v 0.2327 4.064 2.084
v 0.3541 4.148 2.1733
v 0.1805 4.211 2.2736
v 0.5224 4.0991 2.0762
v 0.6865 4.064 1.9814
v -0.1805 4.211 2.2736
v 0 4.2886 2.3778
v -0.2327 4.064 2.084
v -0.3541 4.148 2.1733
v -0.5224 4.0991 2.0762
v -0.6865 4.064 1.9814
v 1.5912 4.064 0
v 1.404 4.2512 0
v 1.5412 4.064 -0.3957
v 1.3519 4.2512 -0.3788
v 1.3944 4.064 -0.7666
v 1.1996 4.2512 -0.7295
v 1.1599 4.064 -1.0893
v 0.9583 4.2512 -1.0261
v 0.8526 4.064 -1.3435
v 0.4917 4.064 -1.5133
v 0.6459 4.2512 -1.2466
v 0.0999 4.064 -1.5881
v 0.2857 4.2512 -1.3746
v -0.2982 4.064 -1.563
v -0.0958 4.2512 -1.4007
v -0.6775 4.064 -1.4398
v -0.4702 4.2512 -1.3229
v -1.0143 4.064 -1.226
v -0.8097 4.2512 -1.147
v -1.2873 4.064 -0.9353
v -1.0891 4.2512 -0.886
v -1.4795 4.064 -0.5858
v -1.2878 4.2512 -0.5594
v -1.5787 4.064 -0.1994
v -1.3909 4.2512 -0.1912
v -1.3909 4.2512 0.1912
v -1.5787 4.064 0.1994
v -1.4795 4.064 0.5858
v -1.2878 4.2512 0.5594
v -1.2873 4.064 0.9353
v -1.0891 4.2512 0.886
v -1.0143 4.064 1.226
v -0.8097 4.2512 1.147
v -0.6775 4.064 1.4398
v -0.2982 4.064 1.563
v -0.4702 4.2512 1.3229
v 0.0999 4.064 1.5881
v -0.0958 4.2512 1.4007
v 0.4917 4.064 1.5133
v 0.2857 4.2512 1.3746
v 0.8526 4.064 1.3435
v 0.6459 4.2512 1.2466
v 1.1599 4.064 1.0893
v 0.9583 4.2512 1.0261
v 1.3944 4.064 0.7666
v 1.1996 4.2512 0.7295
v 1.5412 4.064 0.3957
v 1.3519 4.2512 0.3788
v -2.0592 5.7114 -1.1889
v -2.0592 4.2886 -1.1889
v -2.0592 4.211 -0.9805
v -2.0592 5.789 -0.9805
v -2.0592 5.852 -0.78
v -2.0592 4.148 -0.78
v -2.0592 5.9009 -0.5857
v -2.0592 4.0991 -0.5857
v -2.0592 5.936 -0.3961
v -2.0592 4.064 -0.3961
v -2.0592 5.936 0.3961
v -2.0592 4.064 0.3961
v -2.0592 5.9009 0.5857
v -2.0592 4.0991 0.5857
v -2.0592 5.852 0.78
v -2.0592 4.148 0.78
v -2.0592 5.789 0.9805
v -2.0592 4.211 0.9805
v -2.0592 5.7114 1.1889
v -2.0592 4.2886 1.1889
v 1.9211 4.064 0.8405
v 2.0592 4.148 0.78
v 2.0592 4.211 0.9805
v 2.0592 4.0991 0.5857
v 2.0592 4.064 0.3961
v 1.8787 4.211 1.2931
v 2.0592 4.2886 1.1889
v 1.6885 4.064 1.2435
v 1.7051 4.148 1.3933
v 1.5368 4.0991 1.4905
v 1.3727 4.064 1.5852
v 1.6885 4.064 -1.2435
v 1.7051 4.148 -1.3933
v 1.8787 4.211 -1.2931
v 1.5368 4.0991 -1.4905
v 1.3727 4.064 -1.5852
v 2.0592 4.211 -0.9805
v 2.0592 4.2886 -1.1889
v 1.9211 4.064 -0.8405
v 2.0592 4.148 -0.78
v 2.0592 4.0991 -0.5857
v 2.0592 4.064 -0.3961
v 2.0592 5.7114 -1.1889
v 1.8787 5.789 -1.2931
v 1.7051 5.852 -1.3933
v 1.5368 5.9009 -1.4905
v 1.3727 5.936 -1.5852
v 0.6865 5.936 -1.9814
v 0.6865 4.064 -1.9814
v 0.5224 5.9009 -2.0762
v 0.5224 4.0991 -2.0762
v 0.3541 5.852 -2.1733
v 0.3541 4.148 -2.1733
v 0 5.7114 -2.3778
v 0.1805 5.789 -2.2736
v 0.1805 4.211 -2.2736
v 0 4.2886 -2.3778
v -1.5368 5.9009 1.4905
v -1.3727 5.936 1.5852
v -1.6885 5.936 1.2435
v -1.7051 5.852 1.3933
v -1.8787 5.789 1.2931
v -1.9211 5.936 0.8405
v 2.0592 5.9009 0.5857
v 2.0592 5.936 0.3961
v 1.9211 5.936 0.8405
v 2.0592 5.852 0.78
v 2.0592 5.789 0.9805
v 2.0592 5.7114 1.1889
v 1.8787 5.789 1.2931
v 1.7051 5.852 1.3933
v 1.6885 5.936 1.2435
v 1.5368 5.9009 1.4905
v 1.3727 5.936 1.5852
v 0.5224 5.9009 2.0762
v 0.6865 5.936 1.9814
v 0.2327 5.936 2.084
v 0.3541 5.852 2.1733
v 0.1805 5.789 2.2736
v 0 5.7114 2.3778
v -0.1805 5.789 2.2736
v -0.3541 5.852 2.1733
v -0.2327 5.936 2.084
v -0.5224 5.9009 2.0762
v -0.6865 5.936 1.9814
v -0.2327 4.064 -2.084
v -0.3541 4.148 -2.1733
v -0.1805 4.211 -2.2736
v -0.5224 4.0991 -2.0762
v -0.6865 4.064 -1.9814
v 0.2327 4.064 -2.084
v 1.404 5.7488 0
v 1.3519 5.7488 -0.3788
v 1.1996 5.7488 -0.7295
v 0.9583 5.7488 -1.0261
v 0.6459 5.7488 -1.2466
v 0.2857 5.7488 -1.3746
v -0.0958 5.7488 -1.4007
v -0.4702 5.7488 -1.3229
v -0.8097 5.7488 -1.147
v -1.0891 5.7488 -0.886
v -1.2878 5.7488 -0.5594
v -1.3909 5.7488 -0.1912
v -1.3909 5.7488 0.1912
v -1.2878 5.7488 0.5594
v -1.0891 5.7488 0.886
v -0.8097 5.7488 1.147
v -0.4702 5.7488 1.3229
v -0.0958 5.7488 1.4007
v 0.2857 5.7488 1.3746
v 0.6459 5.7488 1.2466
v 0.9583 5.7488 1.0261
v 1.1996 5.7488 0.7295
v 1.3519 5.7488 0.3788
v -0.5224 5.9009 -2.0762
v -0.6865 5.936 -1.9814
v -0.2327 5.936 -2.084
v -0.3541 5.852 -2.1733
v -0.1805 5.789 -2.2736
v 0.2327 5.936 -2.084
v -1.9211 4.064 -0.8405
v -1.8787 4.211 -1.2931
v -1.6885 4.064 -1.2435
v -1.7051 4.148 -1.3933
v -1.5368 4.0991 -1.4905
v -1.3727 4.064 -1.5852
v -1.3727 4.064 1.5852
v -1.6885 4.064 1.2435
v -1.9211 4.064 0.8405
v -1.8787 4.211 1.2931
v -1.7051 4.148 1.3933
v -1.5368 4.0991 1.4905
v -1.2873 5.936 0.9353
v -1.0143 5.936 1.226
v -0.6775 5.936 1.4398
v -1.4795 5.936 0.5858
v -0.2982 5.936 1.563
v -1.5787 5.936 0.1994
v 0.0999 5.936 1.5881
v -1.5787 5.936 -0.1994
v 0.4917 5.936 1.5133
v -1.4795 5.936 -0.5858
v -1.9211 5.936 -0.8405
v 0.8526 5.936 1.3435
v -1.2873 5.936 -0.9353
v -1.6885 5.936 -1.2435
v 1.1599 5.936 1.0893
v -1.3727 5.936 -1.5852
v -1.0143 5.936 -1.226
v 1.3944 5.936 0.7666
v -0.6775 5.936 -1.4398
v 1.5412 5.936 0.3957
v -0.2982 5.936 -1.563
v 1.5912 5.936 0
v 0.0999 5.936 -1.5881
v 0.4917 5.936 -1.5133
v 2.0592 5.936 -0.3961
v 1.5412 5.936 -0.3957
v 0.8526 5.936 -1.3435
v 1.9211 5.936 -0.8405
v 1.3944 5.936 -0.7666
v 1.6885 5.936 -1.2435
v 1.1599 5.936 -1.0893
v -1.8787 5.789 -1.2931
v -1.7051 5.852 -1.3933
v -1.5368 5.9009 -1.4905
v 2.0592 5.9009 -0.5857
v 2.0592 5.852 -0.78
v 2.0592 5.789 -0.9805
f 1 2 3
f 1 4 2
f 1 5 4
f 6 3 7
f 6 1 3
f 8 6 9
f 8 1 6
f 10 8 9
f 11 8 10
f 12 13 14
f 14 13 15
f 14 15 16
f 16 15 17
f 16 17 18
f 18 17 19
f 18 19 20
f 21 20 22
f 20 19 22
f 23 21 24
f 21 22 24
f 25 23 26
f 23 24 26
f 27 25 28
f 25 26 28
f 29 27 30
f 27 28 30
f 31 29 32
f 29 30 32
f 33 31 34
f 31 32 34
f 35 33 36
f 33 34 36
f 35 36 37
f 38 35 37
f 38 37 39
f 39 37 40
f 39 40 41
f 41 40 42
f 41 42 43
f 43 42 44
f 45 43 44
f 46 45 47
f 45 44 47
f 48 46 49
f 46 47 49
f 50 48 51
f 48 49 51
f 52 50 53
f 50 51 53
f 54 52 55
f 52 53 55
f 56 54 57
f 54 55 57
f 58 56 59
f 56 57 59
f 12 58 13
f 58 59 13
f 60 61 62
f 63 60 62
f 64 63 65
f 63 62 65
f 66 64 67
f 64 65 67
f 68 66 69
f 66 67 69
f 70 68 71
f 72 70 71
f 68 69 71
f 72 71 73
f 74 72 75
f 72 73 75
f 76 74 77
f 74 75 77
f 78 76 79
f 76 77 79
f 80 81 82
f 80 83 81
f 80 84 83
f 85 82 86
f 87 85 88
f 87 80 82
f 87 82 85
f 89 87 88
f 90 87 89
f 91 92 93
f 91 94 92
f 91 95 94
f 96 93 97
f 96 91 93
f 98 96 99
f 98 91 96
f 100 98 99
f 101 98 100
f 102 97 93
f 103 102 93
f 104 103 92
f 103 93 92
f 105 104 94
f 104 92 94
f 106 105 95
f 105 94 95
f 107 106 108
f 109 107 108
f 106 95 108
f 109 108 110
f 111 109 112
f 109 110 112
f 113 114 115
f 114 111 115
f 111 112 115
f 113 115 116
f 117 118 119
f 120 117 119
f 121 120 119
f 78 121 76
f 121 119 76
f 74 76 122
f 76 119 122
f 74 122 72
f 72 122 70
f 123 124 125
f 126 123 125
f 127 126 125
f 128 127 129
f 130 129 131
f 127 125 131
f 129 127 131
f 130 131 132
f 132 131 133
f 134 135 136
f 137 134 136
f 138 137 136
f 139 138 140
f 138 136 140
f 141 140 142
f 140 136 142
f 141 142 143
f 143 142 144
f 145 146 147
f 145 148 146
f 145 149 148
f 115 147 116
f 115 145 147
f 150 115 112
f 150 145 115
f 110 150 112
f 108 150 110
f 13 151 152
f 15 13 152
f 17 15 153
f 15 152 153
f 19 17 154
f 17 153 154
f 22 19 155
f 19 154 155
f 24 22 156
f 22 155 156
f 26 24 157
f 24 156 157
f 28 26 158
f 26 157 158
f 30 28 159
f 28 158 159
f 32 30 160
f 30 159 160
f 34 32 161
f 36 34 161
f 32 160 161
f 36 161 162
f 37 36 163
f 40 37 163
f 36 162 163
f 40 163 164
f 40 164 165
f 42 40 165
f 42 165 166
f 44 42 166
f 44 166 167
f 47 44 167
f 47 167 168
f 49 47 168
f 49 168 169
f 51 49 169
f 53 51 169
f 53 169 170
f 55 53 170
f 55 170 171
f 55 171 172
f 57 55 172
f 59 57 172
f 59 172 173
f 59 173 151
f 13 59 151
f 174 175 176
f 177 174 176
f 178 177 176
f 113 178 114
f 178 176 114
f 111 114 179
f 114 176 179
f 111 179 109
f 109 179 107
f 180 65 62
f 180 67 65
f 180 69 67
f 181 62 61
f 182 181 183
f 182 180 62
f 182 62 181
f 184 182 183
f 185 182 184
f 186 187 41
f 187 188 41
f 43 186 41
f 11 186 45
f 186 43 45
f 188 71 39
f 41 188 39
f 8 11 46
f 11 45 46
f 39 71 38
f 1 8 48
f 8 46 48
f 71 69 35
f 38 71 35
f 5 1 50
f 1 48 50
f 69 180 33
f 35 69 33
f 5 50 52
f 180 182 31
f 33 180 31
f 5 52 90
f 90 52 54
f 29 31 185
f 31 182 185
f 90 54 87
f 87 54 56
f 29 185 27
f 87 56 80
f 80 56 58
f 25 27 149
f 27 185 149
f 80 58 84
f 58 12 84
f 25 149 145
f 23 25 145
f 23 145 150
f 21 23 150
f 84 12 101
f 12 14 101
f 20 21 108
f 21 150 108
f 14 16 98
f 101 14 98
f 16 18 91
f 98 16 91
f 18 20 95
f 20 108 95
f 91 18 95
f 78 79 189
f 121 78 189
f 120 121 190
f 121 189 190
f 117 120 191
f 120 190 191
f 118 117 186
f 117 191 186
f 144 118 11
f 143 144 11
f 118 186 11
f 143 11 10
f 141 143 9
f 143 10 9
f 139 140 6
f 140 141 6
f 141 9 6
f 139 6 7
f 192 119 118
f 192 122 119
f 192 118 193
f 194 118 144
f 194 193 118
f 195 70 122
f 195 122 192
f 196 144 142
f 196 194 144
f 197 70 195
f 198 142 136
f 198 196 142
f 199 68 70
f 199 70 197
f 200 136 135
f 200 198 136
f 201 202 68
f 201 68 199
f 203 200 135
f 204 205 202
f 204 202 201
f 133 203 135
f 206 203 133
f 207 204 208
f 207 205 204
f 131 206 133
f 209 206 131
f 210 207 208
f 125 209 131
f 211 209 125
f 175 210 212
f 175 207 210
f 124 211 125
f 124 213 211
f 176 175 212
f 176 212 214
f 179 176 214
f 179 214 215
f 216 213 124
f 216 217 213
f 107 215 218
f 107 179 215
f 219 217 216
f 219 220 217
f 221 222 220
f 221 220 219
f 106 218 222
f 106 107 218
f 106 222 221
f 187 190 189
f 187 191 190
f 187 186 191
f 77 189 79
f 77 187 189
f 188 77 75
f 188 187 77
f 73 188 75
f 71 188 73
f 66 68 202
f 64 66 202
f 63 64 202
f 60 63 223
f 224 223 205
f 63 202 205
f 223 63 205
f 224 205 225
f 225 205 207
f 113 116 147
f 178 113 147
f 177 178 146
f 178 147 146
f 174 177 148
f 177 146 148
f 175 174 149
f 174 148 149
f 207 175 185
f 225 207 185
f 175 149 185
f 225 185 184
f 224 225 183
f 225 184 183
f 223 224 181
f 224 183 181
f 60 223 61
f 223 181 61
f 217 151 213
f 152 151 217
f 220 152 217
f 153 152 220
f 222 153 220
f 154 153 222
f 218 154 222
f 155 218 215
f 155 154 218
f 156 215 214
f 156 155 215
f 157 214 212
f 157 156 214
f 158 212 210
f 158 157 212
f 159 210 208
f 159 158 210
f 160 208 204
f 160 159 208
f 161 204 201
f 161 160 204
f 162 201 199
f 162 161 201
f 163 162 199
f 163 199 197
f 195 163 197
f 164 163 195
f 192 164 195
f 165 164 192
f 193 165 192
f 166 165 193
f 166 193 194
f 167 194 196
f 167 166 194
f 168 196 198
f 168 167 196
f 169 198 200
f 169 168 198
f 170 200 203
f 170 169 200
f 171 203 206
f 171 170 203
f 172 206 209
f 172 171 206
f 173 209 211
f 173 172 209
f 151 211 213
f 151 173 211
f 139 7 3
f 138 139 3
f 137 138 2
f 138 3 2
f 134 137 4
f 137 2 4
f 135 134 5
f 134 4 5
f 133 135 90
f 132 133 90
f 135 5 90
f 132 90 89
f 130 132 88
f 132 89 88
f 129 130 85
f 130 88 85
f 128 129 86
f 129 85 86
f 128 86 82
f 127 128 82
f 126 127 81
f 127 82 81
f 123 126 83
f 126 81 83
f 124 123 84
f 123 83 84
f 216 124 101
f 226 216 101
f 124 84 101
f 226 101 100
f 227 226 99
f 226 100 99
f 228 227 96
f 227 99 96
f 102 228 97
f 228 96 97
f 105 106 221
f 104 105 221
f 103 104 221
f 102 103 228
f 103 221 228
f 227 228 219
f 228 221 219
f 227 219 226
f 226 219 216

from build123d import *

# Parameters (mm, degrees)
BOSS_EXTRUDE1_DEPTH = 10
SKETCH2_R           = 7.5
CUT_EXTRUDE1_DEPTH  = 11
CHAMFER1_SIZE       = 1
SCALE2_SCALE        = 0.18
SCALE3_SCALE        = 1.04


with BuildPart() as part:
    # Sketch1 → Boss-Extrude1 (new body)
    with BuildSketch(Plane(origin=(0, 0, 0), x_dir=(1, 0, 0), z_dir=(0, 1, 0))):
        Polygon((0, 12.701705922), (-11, 6.350852961), (-11, -6.350852961), (0, -12.701705922), (11, -6.350852961), (11, 6.350852961), align=None)
    extrude(amount=BOSS_EXTRUDE1_DEPTH)

    # Sketch2 → Cut-Extrude1 (cut, through all)
    with BuildSketch(Plane(origin=(0, 10, 0), x_dir=(1, 0, 0), z_dir=(0, 1, 0))):
        Circle(SKETCH2_R)
    extrude(amount=-CUT_EXTRUDE1_DEPTH, mode=Mode.SUBTRACT)

    # Chamfer1
    chamfer1_edges = [part.edges().sort_by_distance(p)[0] for p in [
        (-7.5, 0, 0),
        (-7.5, 10, 0),
    ]]
    chamfer(chamfer1_edges, length=CHAMFER1_SIZE)

    # Sketch3 → Cut-Revolve1 (revolve, cut)
    with BuildSketch(Plane(origin=(0, 0, 0), x_dir=(0, 0, -1), z_dir=(1, 0, 0))):
        Polygon((-12.701705922, 10), (-12.701705922, 8.8), (-11.201705922, 10), align=None)
        Polygon((-12.701705922, 0), (-12.701705922, 1.2), (-11.201705922, 0), align=None)
    revolve(axis=Axis((0, 10, 0), (0, -1, 0)), mode=Mode.SUBTRACT)


with BuildPart() as part_1:
    # Scale2: scaled about (0, 5, 0)
    add(part.part.scale(SCALE2_SCALE).moved(Location((0, 4.1, 0))))


with BuildPart() as part_2:
    # Scale3: scaled about (0, 5, 0)
    add(part_1.part.scale(SCALE3_SCALE).moved(Location((0, -0.2, 0))))


solid = part_2.part
